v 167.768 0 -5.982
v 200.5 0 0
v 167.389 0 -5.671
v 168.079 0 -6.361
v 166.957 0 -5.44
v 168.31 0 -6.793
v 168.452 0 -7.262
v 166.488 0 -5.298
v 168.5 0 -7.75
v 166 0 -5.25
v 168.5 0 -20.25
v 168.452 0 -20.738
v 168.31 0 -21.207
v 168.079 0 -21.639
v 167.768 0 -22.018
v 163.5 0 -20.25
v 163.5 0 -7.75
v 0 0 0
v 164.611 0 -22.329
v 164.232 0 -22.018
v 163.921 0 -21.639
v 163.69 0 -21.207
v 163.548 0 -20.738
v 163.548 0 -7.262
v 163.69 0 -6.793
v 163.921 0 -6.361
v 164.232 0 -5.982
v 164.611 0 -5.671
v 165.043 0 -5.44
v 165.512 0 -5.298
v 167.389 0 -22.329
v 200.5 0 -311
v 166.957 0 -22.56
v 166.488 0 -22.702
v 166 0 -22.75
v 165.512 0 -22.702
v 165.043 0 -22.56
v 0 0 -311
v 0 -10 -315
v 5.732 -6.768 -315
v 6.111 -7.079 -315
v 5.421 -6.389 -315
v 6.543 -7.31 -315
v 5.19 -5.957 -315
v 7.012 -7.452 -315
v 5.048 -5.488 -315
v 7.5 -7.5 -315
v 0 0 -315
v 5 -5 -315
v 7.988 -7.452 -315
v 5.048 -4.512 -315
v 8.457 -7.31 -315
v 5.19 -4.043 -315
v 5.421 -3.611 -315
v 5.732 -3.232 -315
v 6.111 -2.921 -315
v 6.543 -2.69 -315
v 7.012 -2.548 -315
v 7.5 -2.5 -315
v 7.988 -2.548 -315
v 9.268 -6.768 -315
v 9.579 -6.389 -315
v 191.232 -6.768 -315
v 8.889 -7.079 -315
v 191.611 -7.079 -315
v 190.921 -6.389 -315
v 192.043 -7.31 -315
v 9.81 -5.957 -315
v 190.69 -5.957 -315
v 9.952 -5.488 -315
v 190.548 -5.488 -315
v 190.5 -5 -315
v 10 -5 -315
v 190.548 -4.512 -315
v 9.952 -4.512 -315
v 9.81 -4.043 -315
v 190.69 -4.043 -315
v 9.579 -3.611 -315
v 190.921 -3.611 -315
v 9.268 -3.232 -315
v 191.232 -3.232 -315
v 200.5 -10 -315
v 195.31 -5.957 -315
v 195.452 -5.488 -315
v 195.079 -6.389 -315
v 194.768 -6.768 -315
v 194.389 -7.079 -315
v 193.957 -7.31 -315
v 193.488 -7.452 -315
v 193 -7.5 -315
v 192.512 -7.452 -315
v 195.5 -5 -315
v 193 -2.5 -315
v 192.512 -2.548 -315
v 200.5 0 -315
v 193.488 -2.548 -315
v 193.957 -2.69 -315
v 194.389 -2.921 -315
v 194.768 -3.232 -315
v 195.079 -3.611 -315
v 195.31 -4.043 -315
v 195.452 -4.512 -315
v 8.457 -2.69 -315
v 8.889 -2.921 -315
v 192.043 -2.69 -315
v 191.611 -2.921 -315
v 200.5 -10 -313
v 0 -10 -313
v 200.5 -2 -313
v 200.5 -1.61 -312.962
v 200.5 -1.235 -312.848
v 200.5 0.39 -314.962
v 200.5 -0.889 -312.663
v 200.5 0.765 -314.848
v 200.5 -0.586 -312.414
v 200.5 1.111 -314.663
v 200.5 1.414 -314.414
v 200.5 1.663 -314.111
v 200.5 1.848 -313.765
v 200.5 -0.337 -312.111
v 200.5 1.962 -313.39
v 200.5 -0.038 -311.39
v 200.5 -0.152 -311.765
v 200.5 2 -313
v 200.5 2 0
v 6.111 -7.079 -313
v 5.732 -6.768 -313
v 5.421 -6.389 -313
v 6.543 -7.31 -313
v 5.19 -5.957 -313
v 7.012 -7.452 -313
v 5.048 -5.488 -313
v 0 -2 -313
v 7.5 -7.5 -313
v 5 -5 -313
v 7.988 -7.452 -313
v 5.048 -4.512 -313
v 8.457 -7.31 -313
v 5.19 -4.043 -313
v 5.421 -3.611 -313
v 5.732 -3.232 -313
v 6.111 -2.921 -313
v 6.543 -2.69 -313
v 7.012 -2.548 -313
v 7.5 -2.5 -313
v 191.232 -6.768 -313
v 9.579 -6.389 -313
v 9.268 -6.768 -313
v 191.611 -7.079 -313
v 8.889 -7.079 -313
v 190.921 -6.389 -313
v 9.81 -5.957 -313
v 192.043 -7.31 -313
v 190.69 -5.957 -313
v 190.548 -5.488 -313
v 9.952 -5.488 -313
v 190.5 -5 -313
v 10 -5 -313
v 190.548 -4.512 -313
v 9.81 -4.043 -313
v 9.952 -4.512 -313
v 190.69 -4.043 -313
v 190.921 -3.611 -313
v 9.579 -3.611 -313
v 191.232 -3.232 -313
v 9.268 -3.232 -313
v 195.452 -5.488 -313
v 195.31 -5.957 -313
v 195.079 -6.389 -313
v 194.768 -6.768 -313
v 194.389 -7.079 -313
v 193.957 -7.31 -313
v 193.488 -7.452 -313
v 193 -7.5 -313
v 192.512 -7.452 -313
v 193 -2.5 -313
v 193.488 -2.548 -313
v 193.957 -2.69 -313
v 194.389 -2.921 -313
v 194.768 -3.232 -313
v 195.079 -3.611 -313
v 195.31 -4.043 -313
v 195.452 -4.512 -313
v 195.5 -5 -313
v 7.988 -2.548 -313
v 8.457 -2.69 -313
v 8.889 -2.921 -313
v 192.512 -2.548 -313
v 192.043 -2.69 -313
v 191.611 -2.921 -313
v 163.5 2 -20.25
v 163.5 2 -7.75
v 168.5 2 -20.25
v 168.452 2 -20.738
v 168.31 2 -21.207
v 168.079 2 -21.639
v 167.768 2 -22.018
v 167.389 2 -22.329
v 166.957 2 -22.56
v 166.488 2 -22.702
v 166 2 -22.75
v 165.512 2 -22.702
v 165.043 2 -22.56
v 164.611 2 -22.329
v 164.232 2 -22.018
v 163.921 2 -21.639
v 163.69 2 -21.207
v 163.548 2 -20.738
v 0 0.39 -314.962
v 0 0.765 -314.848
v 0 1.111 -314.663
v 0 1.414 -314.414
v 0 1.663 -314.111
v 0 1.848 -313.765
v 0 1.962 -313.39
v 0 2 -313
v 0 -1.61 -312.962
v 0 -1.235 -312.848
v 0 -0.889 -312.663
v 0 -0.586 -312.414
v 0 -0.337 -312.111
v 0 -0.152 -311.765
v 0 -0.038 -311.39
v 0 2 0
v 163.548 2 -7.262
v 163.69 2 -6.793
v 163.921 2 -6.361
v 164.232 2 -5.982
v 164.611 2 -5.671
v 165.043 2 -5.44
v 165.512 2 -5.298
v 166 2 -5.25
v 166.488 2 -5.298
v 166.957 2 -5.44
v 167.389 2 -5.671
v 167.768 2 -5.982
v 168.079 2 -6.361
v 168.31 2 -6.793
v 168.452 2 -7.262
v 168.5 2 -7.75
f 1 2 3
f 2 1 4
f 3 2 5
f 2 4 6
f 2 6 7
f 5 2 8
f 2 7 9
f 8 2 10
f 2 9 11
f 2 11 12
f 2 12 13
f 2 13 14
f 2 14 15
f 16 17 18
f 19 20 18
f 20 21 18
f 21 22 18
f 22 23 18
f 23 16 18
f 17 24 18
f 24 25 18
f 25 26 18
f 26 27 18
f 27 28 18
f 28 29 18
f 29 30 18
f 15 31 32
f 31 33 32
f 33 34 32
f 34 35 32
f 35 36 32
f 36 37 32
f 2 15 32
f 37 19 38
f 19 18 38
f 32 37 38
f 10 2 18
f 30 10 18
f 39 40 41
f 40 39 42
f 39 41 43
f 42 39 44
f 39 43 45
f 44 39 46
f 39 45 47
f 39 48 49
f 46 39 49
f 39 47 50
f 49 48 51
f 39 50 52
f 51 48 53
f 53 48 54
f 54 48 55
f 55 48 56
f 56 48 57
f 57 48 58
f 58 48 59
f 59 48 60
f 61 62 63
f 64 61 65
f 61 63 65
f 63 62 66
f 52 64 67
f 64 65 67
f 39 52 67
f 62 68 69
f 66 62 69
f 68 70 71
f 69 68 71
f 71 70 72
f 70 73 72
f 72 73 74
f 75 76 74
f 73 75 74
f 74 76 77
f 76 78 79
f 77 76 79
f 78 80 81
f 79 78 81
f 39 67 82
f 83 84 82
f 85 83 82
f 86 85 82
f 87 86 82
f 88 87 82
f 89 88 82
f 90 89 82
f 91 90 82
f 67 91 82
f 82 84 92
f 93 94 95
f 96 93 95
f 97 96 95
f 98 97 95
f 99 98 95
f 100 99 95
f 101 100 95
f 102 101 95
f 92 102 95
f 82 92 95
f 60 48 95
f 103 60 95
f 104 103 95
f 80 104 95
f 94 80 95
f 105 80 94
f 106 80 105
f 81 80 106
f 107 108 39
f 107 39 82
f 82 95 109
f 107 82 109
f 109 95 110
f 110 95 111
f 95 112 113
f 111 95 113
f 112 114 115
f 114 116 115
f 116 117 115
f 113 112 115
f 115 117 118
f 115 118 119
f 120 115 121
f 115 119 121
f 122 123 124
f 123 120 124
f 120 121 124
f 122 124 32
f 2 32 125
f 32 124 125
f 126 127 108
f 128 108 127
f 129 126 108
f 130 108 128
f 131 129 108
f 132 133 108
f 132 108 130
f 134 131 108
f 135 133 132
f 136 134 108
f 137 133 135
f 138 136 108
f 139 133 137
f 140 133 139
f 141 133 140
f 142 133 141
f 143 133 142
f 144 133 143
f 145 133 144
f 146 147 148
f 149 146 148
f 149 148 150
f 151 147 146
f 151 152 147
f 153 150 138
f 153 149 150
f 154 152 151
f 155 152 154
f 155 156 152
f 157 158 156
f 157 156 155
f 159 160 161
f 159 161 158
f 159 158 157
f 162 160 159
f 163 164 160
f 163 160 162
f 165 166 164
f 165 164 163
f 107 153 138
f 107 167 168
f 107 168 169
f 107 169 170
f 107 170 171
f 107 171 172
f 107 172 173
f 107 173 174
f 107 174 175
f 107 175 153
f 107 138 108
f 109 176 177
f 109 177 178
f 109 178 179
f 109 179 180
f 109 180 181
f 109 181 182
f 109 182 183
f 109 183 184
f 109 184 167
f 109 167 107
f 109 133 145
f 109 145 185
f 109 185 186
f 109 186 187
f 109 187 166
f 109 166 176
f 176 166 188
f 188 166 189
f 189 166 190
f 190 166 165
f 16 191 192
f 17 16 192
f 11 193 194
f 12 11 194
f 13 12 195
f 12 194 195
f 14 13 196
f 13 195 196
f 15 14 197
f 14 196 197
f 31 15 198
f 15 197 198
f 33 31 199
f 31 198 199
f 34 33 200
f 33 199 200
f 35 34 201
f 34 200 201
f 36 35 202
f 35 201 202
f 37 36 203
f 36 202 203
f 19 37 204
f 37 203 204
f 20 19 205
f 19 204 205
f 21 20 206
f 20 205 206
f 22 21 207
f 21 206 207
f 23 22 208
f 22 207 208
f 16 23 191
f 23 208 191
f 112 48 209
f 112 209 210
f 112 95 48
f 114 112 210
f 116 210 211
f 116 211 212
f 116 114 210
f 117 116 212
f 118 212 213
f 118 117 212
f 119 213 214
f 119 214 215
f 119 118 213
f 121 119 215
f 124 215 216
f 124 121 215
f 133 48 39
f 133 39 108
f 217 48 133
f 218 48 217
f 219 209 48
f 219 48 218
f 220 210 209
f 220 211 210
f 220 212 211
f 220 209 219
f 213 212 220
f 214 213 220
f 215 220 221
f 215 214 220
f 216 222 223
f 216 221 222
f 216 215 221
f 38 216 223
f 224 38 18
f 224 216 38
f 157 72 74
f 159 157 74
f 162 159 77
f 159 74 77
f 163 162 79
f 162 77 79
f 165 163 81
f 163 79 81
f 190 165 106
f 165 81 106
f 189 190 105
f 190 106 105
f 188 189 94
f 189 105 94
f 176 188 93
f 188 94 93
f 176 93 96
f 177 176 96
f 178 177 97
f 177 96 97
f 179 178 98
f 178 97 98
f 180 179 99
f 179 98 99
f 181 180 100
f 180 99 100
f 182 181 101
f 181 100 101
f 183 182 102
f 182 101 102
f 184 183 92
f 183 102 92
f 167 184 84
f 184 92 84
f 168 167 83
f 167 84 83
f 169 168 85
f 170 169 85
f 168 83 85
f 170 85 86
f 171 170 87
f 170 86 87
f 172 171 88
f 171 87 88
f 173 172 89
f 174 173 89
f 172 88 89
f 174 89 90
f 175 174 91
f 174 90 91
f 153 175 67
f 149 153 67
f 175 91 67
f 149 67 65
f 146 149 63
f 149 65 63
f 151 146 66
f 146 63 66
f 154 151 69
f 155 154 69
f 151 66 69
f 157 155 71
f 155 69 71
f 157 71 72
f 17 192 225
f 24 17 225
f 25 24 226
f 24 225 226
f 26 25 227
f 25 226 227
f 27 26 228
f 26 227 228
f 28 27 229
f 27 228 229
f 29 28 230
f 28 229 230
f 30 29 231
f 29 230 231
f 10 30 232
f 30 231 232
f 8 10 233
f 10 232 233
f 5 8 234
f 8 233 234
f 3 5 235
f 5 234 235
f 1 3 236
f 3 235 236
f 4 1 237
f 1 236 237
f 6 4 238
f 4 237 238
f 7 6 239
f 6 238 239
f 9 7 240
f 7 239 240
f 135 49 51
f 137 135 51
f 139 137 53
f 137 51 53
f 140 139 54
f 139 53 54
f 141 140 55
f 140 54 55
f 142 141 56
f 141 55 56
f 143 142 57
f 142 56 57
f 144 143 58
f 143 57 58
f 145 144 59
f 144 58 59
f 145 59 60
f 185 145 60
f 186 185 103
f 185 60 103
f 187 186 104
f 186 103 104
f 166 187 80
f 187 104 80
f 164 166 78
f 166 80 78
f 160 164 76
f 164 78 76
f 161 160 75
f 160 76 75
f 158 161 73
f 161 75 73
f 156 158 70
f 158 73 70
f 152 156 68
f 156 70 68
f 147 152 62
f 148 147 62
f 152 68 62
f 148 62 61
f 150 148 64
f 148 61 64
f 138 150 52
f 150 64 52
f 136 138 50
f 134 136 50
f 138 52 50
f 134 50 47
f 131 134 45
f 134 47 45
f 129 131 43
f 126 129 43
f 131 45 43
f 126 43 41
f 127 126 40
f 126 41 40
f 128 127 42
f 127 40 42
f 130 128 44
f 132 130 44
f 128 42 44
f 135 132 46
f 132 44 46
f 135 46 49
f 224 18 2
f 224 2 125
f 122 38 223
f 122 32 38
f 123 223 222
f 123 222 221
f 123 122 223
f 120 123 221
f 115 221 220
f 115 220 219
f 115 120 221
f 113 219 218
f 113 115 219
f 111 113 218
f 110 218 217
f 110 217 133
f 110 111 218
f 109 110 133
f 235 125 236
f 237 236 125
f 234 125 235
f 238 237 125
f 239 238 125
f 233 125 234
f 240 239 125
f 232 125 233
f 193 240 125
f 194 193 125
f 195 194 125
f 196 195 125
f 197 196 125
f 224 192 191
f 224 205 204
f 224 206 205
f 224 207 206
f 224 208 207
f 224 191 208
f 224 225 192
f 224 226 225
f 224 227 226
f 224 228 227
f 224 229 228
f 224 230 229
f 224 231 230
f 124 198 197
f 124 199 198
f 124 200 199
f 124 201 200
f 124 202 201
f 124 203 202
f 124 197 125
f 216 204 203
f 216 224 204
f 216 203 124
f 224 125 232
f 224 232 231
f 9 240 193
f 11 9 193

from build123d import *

# Parameters (mm, degrees)
SKETCH1_W           = 315
SKETCH1_H           = 2
BOSS_EXTRUDE1_DEPTH = 200.5
SKETCH16_W          = 200.5
SKETCH16_H          = 2
BOSS_EXTRUDE2_DEPTH = 10
FILLET1_R           = 2
FILLET2_R           = 2
SKETCH17_R          = 2.5
CUT_EXTRUDE1_DEPTH  = 2
CUT_EXTRUDE2_DEPTH  = 2


with BuildPart() as part:
    # Sketch1 → Boss-Extrude1 (new body)
    with BuildSketch(Plane(origin=(0, 0, 0), x_dir=(0, 0, -1), z_dir=(1, 0, 0))):
        with Locations((157.5, 1)):
            Rectangle(SKETCH1_W, SKETCH1_H)
    extrude(amount=BOSS_EXTRUDE1_DEPTH)

    # Sketch16 → Boss-Extrude2 (add)
    with BuildSketch(Plane.XZ):
        with Locations((100.25, -314)):
            Rectangle(SKETCH16_W, SKETCH16_H)
    extrude(amount=BOSS_EXTRUDE2_DEPTH)

    # Fillet1
    fillet1_edges = [part.edges().sort_by_distance(p)[0] for p in [
        (100.25, 2, -315),
    ]]
    fillet(fillet1_edges, radius=FILLET1_R)

    # Fillet2
    fillet2_edges = [part.edges().sort_by_distance(p)[0] for p in [
        (100.25, 0, -313),
    ]]
    fillet(fillet2_edges, radius=FILLET2_R)

    # Sketch17 → Cut-Extrude1 (cut)
    with BuildSketch(Plane(origin=(0, 0, -315), x_dir=(-1, 0, 0), z_dir=(0, 0, -1))):
        with Locations((-193, -5)):
            Circle(SKETCH17_R)
        with Locations((-7.5, -5)):
            Circle(SKETCH17_R)
    extrude(amount=-CUT_EXTRUDE1_DEPTH, mode=Mode.SUBTRACT)

    # Sketch19 → Cut-Extrude2 (cut)
    with BuildSketch(Plane(origin=(0, 2, 0), x_dir=(1, 0, 0), z_dir=(0, 1, 0))):
        with BuildLine():
            Line((163.5, 20.25), (163.5, 7.75))
            ThreePointArc((163.5, 7.75), (166, 5.25), (168.5, 7.75))
            Line((168.5, 7.75), (168.5, 20.25))
            ThreePointArc((168.5, 20.25), (166, 22.75), (163.5, 20.25))
        make_face()
    extrude(amount=-CUT_EXTRUDE2_DEPTH, mode=Mode.SUBTRACT)


solid = part.part
